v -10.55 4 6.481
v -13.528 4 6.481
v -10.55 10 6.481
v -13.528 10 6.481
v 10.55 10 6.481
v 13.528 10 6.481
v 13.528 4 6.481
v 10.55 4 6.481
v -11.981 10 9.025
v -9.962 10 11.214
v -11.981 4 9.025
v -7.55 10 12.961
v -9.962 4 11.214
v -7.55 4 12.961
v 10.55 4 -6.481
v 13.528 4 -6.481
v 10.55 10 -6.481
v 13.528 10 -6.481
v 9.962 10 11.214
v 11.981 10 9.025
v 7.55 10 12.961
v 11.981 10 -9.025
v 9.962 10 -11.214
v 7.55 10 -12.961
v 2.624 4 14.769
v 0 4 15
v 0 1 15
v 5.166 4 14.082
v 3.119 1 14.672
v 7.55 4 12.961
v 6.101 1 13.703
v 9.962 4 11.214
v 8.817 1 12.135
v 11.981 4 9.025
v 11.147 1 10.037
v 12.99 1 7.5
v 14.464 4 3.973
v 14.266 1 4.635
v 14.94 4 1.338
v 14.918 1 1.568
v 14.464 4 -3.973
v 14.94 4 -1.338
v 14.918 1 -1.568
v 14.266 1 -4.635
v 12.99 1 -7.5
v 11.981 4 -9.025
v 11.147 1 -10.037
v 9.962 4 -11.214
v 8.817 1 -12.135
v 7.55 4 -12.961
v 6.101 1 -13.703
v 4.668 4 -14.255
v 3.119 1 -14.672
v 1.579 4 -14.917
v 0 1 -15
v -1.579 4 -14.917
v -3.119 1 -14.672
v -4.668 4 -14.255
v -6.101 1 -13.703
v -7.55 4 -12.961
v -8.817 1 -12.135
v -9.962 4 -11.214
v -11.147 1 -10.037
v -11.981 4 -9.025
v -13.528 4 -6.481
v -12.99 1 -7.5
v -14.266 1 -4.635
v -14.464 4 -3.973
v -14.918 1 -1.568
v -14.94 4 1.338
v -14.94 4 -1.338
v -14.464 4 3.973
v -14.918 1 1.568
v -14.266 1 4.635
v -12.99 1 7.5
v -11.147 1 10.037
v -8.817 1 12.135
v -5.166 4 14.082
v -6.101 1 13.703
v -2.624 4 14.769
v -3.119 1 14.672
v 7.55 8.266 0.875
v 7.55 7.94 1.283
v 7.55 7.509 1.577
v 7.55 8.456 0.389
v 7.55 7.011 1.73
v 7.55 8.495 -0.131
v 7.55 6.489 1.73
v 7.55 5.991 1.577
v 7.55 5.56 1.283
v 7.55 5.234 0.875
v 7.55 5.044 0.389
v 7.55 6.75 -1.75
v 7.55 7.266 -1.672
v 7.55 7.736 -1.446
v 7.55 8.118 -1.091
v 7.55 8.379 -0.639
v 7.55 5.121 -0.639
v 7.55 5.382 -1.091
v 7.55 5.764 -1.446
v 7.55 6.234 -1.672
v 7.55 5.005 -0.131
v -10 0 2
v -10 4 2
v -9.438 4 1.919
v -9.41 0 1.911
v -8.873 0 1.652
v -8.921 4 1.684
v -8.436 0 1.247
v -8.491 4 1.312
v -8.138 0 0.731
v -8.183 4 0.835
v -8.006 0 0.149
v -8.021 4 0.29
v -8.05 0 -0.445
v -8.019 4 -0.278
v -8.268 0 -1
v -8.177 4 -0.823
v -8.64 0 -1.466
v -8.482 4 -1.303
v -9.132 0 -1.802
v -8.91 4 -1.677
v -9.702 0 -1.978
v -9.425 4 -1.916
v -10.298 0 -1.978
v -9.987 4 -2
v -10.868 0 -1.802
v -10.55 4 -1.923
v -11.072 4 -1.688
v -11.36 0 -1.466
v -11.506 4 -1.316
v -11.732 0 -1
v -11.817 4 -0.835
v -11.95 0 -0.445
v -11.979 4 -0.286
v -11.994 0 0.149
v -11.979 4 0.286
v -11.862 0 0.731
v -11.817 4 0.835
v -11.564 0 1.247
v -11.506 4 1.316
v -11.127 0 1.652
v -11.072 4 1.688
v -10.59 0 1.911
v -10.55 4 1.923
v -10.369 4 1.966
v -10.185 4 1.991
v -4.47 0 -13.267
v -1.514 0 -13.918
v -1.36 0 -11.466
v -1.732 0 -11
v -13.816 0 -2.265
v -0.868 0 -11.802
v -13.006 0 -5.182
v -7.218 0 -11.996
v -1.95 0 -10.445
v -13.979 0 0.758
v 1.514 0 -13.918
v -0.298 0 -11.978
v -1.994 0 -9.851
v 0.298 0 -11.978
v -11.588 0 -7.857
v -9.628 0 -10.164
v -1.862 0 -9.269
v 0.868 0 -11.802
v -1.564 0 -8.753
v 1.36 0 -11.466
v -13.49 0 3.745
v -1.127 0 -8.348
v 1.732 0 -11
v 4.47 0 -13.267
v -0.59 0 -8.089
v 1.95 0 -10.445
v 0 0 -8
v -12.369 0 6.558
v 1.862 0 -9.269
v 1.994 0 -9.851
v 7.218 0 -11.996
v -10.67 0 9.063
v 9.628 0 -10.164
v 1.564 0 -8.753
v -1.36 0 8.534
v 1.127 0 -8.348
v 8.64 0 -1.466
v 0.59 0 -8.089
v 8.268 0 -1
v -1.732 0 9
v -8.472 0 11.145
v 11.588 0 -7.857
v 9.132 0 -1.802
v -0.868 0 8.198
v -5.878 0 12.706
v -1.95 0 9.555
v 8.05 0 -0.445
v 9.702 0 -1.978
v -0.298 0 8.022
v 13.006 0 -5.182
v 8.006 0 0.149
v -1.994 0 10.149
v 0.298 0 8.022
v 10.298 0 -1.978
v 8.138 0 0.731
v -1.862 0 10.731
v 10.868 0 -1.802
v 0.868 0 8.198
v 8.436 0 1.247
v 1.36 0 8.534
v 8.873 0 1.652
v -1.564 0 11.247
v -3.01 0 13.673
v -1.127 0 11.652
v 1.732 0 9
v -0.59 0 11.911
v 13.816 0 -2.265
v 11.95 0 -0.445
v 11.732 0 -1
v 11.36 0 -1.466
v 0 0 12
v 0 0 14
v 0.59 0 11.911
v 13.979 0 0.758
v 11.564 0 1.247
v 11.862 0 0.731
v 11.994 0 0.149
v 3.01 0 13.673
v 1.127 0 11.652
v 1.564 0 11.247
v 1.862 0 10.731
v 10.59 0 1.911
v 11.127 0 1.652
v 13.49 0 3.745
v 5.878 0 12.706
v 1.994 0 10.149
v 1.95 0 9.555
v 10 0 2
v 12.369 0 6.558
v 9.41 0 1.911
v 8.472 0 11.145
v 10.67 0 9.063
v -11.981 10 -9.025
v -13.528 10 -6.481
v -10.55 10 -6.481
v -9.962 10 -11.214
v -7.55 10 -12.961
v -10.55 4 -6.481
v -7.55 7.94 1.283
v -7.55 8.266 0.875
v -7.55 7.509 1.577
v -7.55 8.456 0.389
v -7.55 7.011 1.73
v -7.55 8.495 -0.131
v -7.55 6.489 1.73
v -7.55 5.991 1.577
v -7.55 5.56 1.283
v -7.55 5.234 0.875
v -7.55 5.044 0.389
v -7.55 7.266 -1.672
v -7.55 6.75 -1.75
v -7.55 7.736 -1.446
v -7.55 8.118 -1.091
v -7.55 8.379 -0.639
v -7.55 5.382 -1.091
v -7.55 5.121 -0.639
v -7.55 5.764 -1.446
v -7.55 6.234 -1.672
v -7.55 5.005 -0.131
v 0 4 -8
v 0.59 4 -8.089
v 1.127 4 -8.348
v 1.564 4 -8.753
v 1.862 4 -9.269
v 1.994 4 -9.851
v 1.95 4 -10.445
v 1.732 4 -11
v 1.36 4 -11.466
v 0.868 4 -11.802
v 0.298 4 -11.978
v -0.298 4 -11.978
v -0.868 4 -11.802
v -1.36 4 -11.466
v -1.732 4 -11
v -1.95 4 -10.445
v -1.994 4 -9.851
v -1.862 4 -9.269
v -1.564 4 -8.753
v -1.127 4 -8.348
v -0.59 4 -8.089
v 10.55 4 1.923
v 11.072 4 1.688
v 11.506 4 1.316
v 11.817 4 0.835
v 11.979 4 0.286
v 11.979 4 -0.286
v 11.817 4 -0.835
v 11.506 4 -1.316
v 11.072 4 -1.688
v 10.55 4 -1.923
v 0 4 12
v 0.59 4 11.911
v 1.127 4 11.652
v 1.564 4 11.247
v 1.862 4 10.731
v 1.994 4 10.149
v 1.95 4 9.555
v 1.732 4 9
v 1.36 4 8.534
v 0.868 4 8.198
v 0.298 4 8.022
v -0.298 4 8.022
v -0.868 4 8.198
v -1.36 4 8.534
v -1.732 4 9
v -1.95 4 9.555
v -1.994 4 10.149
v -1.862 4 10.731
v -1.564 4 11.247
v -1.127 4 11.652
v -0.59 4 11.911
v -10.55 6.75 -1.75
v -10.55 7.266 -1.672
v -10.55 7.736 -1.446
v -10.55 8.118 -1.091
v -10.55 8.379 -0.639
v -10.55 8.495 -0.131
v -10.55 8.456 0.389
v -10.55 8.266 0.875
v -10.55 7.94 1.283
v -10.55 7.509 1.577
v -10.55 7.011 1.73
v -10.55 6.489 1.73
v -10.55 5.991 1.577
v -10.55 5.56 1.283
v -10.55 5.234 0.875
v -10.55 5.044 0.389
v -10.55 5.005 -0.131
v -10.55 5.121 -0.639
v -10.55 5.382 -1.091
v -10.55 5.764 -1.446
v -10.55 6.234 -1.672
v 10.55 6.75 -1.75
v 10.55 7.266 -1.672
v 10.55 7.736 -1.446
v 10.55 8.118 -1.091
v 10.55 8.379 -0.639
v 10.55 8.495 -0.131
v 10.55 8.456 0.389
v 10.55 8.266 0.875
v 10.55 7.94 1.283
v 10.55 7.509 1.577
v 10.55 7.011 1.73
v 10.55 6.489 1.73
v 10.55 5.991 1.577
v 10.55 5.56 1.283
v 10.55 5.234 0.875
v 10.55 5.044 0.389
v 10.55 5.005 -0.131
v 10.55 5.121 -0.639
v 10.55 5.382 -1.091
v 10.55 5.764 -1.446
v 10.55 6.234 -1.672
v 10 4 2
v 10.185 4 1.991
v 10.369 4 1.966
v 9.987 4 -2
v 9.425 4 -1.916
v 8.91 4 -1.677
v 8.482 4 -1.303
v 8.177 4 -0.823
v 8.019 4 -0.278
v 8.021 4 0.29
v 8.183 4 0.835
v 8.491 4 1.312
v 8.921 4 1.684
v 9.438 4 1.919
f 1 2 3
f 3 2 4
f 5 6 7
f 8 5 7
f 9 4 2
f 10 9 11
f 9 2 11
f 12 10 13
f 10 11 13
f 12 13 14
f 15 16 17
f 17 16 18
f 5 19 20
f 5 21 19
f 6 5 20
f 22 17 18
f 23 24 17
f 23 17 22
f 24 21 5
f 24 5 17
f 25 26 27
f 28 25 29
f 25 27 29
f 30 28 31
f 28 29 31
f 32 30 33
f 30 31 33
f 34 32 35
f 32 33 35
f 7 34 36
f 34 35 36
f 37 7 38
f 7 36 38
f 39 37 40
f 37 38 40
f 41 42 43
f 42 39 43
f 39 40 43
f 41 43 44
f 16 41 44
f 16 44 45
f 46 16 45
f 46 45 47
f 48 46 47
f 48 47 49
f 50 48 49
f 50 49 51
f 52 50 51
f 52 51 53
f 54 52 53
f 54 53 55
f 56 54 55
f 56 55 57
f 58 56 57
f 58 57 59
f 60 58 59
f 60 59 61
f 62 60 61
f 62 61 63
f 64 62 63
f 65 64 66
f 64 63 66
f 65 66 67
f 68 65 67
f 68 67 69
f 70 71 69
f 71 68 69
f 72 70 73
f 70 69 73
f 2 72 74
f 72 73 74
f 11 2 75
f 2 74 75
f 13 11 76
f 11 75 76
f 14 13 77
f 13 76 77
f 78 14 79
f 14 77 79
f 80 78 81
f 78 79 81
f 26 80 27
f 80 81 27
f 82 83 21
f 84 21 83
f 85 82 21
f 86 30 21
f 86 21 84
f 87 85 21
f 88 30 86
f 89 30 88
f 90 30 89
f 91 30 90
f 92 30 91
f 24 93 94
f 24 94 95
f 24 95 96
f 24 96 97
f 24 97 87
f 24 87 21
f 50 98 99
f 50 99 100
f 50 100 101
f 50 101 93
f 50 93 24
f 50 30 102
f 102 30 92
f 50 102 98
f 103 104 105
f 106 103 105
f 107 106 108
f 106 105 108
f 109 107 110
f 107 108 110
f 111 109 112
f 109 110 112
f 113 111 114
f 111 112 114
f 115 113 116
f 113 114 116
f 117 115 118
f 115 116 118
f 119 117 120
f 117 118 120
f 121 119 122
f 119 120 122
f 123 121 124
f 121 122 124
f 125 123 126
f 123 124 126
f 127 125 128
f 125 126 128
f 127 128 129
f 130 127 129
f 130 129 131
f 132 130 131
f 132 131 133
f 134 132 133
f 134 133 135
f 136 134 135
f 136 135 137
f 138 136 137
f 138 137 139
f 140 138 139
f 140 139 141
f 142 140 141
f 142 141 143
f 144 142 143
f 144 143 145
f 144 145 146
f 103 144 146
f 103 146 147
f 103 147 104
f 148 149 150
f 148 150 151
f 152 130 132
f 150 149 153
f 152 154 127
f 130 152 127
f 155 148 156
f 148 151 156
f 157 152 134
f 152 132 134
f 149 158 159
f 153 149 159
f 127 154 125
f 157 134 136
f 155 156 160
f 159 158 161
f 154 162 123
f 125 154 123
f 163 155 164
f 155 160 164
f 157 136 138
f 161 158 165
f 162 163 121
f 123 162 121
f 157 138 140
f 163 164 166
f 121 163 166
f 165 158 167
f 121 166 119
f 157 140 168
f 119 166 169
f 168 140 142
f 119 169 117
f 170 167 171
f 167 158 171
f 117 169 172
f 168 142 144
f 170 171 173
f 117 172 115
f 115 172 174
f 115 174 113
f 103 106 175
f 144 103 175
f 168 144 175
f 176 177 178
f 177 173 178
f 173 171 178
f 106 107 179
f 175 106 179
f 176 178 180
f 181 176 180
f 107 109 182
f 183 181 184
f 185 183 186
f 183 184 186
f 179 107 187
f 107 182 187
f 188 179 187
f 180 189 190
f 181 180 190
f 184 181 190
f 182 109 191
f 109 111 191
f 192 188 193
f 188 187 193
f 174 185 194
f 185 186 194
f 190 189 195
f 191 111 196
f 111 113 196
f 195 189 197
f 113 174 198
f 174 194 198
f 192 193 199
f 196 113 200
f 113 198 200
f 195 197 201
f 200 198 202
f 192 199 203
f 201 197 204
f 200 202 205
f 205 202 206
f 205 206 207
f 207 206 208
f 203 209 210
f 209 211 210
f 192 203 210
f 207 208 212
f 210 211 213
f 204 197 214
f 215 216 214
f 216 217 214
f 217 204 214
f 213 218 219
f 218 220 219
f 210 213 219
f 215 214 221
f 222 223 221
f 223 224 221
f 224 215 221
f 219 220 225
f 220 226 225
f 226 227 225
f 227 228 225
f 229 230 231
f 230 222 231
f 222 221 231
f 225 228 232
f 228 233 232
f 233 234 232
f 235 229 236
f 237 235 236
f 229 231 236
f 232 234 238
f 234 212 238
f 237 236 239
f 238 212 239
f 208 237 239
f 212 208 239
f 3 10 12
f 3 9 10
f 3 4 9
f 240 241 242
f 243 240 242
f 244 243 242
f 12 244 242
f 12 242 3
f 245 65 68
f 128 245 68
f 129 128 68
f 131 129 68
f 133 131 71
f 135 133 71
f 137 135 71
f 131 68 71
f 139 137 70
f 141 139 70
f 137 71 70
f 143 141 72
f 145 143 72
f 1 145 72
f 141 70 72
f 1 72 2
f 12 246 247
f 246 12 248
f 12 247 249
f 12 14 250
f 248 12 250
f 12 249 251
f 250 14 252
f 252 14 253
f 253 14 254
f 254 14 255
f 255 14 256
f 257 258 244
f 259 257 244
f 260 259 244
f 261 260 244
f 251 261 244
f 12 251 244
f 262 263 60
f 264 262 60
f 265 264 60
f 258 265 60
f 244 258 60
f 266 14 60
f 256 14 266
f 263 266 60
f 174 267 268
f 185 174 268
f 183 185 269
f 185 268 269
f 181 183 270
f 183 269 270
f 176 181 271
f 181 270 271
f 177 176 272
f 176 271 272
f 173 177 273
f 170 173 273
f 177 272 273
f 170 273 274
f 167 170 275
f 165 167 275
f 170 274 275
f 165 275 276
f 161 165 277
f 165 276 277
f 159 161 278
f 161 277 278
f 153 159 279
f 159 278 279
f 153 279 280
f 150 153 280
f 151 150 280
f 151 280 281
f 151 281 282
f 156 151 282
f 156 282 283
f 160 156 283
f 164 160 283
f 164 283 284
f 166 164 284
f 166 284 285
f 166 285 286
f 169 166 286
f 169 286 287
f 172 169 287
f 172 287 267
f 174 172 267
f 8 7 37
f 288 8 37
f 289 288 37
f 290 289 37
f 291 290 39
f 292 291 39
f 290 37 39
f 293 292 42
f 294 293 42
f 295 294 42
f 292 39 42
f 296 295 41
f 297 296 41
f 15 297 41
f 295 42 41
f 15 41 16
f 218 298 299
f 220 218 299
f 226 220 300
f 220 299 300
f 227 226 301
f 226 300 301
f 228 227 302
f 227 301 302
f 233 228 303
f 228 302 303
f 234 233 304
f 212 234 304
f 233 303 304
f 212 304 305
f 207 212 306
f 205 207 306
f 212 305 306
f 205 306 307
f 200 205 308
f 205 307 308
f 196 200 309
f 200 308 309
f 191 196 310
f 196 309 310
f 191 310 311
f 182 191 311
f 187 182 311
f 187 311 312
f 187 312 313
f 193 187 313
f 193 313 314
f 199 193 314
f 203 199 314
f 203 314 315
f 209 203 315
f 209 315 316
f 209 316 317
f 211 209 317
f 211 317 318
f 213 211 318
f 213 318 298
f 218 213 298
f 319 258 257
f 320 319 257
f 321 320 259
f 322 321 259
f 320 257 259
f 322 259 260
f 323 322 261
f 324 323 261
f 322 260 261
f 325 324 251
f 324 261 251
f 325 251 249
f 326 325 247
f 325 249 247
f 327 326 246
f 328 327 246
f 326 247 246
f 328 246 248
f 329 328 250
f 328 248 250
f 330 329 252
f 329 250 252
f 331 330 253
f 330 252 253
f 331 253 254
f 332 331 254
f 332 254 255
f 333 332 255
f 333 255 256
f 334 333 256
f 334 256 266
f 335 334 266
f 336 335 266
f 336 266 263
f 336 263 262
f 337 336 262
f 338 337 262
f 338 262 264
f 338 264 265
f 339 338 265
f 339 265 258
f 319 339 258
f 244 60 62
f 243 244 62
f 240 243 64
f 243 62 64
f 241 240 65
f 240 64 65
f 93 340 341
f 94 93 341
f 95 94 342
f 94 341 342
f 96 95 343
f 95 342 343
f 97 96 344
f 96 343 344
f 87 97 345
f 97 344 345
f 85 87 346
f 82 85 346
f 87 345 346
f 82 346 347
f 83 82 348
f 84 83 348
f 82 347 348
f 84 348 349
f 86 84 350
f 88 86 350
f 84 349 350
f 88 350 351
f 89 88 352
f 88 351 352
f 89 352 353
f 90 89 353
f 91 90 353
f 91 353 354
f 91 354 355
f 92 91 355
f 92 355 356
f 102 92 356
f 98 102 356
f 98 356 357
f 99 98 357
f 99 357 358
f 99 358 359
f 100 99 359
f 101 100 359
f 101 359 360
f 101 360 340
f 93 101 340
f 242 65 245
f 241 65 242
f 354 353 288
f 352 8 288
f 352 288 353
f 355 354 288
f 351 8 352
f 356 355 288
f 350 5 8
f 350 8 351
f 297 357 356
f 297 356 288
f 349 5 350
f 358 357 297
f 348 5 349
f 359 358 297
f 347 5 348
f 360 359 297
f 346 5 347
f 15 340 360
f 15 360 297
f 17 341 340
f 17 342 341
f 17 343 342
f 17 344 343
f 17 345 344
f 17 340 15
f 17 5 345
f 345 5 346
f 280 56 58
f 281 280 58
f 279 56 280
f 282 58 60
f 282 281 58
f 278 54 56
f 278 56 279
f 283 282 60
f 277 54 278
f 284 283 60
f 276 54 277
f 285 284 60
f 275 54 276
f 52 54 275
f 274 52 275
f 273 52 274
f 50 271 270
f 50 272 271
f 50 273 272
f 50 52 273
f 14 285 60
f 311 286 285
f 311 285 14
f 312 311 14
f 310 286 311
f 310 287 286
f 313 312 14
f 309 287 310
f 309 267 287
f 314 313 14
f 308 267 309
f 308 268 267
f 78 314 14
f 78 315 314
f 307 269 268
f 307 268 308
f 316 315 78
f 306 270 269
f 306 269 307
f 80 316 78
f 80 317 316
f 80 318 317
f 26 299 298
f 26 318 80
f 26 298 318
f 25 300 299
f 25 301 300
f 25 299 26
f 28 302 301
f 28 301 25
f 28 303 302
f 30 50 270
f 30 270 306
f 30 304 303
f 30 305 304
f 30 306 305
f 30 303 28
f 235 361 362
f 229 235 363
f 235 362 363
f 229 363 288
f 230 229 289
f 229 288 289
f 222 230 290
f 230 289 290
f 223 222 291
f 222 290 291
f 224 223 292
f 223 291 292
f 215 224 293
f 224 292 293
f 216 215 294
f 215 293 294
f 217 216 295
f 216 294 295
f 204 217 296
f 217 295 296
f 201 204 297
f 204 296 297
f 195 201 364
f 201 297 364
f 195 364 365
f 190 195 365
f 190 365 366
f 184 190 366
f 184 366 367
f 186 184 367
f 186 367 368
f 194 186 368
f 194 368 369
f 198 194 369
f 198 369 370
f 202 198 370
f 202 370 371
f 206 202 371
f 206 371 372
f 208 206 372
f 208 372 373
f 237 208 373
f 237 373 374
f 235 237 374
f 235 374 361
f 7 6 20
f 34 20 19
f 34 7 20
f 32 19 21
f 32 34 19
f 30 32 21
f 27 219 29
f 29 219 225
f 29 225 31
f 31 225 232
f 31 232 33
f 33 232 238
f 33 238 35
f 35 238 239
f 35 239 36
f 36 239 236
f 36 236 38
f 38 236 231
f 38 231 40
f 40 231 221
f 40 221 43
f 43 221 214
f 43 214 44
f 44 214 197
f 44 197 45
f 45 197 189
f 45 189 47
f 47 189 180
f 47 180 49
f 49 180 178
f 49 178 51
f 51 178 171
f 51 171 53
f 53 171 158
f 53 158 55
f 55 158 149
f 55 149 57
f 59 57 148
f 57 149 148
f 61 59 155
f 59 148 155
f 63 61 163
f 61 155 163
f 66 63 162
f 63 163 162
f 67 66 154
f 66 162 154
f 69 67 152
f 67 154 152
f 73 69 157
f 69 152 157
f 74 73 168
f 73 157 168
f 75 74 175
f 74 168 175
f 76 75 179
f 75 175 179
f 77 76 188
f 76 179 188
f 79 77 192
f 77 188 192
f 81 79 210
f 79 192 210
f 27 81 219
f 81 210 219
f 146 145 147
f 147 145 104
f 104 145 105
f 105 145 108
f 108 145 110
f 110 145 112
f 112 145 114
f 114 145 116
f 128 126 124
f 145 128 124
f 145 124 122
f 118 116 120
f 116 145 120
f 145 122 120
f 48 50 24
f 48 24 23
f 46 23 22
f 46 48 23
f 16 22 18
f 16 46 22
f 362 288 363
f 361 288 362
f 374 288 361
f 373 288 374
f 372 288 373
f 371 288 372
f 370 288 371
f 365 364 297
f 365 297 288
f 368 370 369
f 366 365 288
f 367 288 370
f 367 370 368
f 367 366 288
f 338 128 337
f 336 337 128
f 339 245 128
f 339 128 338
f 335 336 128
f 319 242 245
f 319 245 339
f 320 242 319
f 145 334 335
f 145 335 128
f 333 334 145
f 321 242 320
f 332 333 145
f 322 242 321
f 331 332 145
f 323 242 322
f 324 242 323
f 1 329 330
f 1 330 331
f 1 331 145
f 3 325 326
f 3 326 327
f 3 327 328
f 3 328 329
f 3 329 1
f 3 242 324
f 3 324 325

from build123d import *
from build123d.topology import SkipClean

# Parameters (mm, degrees)
SKETCH1_R           = 15
BOSS_EXTRUDE1_DEPTH = 4
SKETCH2_R           = 2
CUT_EXTRUDE1_DEPTH  = 5
BOSS_EXTRUDE3_DEPTH = 10
CHAMFER1_SIZE       = 1
SKETCH5_R           = 1.75
CUT_EXTRUDE2_DEPTH  = 37.345563691
CUT_EXTRUDE4_DEPTH  = 4.45
SKETCH8_W           = 12.961384956
SKETCH8_H           = 10
CUT_EXTRUDE5_DEPTH  = 4.45
SKETCH9_R           = 16.342219082
CUT_EXTRUDE6_DEPTH  = 4


with BuildPart() as part:
    # Sketch1 → Boss-Extrude1 (new body)
    with BuildSketch(Plane(origin=(0, 0, 0), x_dir=(1, 0, 0), z_dir=(0, 1, 0))):
        with Locations(Location((0, 0, 0), (0, 0, 270))):
            Circle(SKETCH1_R)
    extrude(amount=BOSS_EXTRUDE1_DEPTH)

    # Sketch2 → Cut-Extrude1 (cut)
    with BuildSketch(Plane(origin=(0, 4, 0), x_dir=(1, 0, 0), z_dir=(0, 1, 0))):
        with Locations(Location((-10, 0, 0), (0, 0, 270))):
            Circle(SKETCH2_R)
        with Locations(Location((0, 10, 0), (0, 0, 270))):
            Circle(SKETCH2_R)
        with Locations(Location((10, 0, 0), (0, 0, 270))):
            Circle(SKETCH2_R)
        with Locations(Location((0, -10, 0), (0, 0, 270))):
            Circle(SKETCH2_R)
    extrude(amount=-CUT_EXTRUDE1_DEPTH, mode=Mode.SUBTRACT)

    # Sketch4 → Boss-Extrude3 (add)
    with SkipClean():  # the faces are left unmerged after this step: merging them gives an invalid solid
        with BuildSketch(Plane(origin=(0, 4, 0), x_dir=(1, 0, 0), z_dir=(0, 1, 0))):
            with BuildLine():
                Line((-7.55, -12.961384957), (-7.55, -0.968245837))
                Line((-7.55, -0.968245837), (-7.55, 0.968245837))
                Line((-7.55, 0.968245837), (-7.55, 12.961384957))
                ThreePointArc((-7.55, 12.961384957), (-15, 0), (-7.55, -12.961384957))
            make_face()
            with BuildLine():
                Line((7.55, -12.961384957), (7.55, -0.968245837))
                Line((7.55, -0.968245837), (7.55, 0.968245837))
                Line((7.55, 0.968245837), (7.55, 12.961384957))
                ThreePointArc((7.55, 12.961384957), (15, 0), (7.55, -12.961384957))
            make_face()
        extrude(amount=BOSS_EXTRUDE3_DEPTH)

    # Chamfer1
    chamfer1_edges = [part.edges().sort_by_distance(p)[0] for p in [
        (0, 0, -15),
    ]]
    chamfer(chamfer1_edges, length=CHAMFER1_SIZE)

    # Sketch5 → Cut-Extrude2 (cut, through all)
    with SkipClean():  # the faces are left unmerged after this step: merging them gives an invalid solid
        with BuildSketch(Plane(origin=(15, 0, 0), x_dir=(0, 0, -1), z_dir=(1, 0, 0))):
            with Locations((0, 6.75)):
                Circle(SKETCH5_R)
        extrude(amount=-CUT_EXTRUDE2_DEPTH, mode=Mode.SUBTRACT)

    # Sketch7 → Cut-Extrude4 (cut)
    with BuildSketch(Plane(origin=(15, 0, 0), x_dir=(0, 0, -1), z_dir=(1, 0, 0))):
        Polygon((-6.480692478, 9), (-6.480692478, 4), (0, 4), (0, 14), (-6.480692478, 14), align=None)
        Polygon((0, 14), (0, 4), (6.480692478, 4), (6.480692478, 9), (6.480692478, 14), align=None)
    extrude(amount=-CUT_EXTRUDE4_DEPTH, mode=Mode.SUBTRACT)

    # Sketch8 → Cut-Extrude5 (cut)
    with BuildSketch(Plane.ZY.offset(15)):
        with Locations((0, 9)):
            Rectangle(SKETCH8_W, SKETCH8_H)
    extrude(amount=-CUT_EXTRUDE5_DEPTH, mode=Mode.SUBTRACT)

    # Sketch9 → Cut-Extrude6 (cut)
    with SkipClean():  # the faces are left unmerged after this step: merging them gives an invalid solid
        with BuildSketch(Plane(origin=(0, 14, 0), x_dir=(1, 0, 0), z_dir=(0, 1, 0))):
            Circle(SKETCH9_R)
        extrude(amount=-CUT_EXTRUDE6_DEPTH, mode=Mode.SUBTRACT)


solid = part.part
